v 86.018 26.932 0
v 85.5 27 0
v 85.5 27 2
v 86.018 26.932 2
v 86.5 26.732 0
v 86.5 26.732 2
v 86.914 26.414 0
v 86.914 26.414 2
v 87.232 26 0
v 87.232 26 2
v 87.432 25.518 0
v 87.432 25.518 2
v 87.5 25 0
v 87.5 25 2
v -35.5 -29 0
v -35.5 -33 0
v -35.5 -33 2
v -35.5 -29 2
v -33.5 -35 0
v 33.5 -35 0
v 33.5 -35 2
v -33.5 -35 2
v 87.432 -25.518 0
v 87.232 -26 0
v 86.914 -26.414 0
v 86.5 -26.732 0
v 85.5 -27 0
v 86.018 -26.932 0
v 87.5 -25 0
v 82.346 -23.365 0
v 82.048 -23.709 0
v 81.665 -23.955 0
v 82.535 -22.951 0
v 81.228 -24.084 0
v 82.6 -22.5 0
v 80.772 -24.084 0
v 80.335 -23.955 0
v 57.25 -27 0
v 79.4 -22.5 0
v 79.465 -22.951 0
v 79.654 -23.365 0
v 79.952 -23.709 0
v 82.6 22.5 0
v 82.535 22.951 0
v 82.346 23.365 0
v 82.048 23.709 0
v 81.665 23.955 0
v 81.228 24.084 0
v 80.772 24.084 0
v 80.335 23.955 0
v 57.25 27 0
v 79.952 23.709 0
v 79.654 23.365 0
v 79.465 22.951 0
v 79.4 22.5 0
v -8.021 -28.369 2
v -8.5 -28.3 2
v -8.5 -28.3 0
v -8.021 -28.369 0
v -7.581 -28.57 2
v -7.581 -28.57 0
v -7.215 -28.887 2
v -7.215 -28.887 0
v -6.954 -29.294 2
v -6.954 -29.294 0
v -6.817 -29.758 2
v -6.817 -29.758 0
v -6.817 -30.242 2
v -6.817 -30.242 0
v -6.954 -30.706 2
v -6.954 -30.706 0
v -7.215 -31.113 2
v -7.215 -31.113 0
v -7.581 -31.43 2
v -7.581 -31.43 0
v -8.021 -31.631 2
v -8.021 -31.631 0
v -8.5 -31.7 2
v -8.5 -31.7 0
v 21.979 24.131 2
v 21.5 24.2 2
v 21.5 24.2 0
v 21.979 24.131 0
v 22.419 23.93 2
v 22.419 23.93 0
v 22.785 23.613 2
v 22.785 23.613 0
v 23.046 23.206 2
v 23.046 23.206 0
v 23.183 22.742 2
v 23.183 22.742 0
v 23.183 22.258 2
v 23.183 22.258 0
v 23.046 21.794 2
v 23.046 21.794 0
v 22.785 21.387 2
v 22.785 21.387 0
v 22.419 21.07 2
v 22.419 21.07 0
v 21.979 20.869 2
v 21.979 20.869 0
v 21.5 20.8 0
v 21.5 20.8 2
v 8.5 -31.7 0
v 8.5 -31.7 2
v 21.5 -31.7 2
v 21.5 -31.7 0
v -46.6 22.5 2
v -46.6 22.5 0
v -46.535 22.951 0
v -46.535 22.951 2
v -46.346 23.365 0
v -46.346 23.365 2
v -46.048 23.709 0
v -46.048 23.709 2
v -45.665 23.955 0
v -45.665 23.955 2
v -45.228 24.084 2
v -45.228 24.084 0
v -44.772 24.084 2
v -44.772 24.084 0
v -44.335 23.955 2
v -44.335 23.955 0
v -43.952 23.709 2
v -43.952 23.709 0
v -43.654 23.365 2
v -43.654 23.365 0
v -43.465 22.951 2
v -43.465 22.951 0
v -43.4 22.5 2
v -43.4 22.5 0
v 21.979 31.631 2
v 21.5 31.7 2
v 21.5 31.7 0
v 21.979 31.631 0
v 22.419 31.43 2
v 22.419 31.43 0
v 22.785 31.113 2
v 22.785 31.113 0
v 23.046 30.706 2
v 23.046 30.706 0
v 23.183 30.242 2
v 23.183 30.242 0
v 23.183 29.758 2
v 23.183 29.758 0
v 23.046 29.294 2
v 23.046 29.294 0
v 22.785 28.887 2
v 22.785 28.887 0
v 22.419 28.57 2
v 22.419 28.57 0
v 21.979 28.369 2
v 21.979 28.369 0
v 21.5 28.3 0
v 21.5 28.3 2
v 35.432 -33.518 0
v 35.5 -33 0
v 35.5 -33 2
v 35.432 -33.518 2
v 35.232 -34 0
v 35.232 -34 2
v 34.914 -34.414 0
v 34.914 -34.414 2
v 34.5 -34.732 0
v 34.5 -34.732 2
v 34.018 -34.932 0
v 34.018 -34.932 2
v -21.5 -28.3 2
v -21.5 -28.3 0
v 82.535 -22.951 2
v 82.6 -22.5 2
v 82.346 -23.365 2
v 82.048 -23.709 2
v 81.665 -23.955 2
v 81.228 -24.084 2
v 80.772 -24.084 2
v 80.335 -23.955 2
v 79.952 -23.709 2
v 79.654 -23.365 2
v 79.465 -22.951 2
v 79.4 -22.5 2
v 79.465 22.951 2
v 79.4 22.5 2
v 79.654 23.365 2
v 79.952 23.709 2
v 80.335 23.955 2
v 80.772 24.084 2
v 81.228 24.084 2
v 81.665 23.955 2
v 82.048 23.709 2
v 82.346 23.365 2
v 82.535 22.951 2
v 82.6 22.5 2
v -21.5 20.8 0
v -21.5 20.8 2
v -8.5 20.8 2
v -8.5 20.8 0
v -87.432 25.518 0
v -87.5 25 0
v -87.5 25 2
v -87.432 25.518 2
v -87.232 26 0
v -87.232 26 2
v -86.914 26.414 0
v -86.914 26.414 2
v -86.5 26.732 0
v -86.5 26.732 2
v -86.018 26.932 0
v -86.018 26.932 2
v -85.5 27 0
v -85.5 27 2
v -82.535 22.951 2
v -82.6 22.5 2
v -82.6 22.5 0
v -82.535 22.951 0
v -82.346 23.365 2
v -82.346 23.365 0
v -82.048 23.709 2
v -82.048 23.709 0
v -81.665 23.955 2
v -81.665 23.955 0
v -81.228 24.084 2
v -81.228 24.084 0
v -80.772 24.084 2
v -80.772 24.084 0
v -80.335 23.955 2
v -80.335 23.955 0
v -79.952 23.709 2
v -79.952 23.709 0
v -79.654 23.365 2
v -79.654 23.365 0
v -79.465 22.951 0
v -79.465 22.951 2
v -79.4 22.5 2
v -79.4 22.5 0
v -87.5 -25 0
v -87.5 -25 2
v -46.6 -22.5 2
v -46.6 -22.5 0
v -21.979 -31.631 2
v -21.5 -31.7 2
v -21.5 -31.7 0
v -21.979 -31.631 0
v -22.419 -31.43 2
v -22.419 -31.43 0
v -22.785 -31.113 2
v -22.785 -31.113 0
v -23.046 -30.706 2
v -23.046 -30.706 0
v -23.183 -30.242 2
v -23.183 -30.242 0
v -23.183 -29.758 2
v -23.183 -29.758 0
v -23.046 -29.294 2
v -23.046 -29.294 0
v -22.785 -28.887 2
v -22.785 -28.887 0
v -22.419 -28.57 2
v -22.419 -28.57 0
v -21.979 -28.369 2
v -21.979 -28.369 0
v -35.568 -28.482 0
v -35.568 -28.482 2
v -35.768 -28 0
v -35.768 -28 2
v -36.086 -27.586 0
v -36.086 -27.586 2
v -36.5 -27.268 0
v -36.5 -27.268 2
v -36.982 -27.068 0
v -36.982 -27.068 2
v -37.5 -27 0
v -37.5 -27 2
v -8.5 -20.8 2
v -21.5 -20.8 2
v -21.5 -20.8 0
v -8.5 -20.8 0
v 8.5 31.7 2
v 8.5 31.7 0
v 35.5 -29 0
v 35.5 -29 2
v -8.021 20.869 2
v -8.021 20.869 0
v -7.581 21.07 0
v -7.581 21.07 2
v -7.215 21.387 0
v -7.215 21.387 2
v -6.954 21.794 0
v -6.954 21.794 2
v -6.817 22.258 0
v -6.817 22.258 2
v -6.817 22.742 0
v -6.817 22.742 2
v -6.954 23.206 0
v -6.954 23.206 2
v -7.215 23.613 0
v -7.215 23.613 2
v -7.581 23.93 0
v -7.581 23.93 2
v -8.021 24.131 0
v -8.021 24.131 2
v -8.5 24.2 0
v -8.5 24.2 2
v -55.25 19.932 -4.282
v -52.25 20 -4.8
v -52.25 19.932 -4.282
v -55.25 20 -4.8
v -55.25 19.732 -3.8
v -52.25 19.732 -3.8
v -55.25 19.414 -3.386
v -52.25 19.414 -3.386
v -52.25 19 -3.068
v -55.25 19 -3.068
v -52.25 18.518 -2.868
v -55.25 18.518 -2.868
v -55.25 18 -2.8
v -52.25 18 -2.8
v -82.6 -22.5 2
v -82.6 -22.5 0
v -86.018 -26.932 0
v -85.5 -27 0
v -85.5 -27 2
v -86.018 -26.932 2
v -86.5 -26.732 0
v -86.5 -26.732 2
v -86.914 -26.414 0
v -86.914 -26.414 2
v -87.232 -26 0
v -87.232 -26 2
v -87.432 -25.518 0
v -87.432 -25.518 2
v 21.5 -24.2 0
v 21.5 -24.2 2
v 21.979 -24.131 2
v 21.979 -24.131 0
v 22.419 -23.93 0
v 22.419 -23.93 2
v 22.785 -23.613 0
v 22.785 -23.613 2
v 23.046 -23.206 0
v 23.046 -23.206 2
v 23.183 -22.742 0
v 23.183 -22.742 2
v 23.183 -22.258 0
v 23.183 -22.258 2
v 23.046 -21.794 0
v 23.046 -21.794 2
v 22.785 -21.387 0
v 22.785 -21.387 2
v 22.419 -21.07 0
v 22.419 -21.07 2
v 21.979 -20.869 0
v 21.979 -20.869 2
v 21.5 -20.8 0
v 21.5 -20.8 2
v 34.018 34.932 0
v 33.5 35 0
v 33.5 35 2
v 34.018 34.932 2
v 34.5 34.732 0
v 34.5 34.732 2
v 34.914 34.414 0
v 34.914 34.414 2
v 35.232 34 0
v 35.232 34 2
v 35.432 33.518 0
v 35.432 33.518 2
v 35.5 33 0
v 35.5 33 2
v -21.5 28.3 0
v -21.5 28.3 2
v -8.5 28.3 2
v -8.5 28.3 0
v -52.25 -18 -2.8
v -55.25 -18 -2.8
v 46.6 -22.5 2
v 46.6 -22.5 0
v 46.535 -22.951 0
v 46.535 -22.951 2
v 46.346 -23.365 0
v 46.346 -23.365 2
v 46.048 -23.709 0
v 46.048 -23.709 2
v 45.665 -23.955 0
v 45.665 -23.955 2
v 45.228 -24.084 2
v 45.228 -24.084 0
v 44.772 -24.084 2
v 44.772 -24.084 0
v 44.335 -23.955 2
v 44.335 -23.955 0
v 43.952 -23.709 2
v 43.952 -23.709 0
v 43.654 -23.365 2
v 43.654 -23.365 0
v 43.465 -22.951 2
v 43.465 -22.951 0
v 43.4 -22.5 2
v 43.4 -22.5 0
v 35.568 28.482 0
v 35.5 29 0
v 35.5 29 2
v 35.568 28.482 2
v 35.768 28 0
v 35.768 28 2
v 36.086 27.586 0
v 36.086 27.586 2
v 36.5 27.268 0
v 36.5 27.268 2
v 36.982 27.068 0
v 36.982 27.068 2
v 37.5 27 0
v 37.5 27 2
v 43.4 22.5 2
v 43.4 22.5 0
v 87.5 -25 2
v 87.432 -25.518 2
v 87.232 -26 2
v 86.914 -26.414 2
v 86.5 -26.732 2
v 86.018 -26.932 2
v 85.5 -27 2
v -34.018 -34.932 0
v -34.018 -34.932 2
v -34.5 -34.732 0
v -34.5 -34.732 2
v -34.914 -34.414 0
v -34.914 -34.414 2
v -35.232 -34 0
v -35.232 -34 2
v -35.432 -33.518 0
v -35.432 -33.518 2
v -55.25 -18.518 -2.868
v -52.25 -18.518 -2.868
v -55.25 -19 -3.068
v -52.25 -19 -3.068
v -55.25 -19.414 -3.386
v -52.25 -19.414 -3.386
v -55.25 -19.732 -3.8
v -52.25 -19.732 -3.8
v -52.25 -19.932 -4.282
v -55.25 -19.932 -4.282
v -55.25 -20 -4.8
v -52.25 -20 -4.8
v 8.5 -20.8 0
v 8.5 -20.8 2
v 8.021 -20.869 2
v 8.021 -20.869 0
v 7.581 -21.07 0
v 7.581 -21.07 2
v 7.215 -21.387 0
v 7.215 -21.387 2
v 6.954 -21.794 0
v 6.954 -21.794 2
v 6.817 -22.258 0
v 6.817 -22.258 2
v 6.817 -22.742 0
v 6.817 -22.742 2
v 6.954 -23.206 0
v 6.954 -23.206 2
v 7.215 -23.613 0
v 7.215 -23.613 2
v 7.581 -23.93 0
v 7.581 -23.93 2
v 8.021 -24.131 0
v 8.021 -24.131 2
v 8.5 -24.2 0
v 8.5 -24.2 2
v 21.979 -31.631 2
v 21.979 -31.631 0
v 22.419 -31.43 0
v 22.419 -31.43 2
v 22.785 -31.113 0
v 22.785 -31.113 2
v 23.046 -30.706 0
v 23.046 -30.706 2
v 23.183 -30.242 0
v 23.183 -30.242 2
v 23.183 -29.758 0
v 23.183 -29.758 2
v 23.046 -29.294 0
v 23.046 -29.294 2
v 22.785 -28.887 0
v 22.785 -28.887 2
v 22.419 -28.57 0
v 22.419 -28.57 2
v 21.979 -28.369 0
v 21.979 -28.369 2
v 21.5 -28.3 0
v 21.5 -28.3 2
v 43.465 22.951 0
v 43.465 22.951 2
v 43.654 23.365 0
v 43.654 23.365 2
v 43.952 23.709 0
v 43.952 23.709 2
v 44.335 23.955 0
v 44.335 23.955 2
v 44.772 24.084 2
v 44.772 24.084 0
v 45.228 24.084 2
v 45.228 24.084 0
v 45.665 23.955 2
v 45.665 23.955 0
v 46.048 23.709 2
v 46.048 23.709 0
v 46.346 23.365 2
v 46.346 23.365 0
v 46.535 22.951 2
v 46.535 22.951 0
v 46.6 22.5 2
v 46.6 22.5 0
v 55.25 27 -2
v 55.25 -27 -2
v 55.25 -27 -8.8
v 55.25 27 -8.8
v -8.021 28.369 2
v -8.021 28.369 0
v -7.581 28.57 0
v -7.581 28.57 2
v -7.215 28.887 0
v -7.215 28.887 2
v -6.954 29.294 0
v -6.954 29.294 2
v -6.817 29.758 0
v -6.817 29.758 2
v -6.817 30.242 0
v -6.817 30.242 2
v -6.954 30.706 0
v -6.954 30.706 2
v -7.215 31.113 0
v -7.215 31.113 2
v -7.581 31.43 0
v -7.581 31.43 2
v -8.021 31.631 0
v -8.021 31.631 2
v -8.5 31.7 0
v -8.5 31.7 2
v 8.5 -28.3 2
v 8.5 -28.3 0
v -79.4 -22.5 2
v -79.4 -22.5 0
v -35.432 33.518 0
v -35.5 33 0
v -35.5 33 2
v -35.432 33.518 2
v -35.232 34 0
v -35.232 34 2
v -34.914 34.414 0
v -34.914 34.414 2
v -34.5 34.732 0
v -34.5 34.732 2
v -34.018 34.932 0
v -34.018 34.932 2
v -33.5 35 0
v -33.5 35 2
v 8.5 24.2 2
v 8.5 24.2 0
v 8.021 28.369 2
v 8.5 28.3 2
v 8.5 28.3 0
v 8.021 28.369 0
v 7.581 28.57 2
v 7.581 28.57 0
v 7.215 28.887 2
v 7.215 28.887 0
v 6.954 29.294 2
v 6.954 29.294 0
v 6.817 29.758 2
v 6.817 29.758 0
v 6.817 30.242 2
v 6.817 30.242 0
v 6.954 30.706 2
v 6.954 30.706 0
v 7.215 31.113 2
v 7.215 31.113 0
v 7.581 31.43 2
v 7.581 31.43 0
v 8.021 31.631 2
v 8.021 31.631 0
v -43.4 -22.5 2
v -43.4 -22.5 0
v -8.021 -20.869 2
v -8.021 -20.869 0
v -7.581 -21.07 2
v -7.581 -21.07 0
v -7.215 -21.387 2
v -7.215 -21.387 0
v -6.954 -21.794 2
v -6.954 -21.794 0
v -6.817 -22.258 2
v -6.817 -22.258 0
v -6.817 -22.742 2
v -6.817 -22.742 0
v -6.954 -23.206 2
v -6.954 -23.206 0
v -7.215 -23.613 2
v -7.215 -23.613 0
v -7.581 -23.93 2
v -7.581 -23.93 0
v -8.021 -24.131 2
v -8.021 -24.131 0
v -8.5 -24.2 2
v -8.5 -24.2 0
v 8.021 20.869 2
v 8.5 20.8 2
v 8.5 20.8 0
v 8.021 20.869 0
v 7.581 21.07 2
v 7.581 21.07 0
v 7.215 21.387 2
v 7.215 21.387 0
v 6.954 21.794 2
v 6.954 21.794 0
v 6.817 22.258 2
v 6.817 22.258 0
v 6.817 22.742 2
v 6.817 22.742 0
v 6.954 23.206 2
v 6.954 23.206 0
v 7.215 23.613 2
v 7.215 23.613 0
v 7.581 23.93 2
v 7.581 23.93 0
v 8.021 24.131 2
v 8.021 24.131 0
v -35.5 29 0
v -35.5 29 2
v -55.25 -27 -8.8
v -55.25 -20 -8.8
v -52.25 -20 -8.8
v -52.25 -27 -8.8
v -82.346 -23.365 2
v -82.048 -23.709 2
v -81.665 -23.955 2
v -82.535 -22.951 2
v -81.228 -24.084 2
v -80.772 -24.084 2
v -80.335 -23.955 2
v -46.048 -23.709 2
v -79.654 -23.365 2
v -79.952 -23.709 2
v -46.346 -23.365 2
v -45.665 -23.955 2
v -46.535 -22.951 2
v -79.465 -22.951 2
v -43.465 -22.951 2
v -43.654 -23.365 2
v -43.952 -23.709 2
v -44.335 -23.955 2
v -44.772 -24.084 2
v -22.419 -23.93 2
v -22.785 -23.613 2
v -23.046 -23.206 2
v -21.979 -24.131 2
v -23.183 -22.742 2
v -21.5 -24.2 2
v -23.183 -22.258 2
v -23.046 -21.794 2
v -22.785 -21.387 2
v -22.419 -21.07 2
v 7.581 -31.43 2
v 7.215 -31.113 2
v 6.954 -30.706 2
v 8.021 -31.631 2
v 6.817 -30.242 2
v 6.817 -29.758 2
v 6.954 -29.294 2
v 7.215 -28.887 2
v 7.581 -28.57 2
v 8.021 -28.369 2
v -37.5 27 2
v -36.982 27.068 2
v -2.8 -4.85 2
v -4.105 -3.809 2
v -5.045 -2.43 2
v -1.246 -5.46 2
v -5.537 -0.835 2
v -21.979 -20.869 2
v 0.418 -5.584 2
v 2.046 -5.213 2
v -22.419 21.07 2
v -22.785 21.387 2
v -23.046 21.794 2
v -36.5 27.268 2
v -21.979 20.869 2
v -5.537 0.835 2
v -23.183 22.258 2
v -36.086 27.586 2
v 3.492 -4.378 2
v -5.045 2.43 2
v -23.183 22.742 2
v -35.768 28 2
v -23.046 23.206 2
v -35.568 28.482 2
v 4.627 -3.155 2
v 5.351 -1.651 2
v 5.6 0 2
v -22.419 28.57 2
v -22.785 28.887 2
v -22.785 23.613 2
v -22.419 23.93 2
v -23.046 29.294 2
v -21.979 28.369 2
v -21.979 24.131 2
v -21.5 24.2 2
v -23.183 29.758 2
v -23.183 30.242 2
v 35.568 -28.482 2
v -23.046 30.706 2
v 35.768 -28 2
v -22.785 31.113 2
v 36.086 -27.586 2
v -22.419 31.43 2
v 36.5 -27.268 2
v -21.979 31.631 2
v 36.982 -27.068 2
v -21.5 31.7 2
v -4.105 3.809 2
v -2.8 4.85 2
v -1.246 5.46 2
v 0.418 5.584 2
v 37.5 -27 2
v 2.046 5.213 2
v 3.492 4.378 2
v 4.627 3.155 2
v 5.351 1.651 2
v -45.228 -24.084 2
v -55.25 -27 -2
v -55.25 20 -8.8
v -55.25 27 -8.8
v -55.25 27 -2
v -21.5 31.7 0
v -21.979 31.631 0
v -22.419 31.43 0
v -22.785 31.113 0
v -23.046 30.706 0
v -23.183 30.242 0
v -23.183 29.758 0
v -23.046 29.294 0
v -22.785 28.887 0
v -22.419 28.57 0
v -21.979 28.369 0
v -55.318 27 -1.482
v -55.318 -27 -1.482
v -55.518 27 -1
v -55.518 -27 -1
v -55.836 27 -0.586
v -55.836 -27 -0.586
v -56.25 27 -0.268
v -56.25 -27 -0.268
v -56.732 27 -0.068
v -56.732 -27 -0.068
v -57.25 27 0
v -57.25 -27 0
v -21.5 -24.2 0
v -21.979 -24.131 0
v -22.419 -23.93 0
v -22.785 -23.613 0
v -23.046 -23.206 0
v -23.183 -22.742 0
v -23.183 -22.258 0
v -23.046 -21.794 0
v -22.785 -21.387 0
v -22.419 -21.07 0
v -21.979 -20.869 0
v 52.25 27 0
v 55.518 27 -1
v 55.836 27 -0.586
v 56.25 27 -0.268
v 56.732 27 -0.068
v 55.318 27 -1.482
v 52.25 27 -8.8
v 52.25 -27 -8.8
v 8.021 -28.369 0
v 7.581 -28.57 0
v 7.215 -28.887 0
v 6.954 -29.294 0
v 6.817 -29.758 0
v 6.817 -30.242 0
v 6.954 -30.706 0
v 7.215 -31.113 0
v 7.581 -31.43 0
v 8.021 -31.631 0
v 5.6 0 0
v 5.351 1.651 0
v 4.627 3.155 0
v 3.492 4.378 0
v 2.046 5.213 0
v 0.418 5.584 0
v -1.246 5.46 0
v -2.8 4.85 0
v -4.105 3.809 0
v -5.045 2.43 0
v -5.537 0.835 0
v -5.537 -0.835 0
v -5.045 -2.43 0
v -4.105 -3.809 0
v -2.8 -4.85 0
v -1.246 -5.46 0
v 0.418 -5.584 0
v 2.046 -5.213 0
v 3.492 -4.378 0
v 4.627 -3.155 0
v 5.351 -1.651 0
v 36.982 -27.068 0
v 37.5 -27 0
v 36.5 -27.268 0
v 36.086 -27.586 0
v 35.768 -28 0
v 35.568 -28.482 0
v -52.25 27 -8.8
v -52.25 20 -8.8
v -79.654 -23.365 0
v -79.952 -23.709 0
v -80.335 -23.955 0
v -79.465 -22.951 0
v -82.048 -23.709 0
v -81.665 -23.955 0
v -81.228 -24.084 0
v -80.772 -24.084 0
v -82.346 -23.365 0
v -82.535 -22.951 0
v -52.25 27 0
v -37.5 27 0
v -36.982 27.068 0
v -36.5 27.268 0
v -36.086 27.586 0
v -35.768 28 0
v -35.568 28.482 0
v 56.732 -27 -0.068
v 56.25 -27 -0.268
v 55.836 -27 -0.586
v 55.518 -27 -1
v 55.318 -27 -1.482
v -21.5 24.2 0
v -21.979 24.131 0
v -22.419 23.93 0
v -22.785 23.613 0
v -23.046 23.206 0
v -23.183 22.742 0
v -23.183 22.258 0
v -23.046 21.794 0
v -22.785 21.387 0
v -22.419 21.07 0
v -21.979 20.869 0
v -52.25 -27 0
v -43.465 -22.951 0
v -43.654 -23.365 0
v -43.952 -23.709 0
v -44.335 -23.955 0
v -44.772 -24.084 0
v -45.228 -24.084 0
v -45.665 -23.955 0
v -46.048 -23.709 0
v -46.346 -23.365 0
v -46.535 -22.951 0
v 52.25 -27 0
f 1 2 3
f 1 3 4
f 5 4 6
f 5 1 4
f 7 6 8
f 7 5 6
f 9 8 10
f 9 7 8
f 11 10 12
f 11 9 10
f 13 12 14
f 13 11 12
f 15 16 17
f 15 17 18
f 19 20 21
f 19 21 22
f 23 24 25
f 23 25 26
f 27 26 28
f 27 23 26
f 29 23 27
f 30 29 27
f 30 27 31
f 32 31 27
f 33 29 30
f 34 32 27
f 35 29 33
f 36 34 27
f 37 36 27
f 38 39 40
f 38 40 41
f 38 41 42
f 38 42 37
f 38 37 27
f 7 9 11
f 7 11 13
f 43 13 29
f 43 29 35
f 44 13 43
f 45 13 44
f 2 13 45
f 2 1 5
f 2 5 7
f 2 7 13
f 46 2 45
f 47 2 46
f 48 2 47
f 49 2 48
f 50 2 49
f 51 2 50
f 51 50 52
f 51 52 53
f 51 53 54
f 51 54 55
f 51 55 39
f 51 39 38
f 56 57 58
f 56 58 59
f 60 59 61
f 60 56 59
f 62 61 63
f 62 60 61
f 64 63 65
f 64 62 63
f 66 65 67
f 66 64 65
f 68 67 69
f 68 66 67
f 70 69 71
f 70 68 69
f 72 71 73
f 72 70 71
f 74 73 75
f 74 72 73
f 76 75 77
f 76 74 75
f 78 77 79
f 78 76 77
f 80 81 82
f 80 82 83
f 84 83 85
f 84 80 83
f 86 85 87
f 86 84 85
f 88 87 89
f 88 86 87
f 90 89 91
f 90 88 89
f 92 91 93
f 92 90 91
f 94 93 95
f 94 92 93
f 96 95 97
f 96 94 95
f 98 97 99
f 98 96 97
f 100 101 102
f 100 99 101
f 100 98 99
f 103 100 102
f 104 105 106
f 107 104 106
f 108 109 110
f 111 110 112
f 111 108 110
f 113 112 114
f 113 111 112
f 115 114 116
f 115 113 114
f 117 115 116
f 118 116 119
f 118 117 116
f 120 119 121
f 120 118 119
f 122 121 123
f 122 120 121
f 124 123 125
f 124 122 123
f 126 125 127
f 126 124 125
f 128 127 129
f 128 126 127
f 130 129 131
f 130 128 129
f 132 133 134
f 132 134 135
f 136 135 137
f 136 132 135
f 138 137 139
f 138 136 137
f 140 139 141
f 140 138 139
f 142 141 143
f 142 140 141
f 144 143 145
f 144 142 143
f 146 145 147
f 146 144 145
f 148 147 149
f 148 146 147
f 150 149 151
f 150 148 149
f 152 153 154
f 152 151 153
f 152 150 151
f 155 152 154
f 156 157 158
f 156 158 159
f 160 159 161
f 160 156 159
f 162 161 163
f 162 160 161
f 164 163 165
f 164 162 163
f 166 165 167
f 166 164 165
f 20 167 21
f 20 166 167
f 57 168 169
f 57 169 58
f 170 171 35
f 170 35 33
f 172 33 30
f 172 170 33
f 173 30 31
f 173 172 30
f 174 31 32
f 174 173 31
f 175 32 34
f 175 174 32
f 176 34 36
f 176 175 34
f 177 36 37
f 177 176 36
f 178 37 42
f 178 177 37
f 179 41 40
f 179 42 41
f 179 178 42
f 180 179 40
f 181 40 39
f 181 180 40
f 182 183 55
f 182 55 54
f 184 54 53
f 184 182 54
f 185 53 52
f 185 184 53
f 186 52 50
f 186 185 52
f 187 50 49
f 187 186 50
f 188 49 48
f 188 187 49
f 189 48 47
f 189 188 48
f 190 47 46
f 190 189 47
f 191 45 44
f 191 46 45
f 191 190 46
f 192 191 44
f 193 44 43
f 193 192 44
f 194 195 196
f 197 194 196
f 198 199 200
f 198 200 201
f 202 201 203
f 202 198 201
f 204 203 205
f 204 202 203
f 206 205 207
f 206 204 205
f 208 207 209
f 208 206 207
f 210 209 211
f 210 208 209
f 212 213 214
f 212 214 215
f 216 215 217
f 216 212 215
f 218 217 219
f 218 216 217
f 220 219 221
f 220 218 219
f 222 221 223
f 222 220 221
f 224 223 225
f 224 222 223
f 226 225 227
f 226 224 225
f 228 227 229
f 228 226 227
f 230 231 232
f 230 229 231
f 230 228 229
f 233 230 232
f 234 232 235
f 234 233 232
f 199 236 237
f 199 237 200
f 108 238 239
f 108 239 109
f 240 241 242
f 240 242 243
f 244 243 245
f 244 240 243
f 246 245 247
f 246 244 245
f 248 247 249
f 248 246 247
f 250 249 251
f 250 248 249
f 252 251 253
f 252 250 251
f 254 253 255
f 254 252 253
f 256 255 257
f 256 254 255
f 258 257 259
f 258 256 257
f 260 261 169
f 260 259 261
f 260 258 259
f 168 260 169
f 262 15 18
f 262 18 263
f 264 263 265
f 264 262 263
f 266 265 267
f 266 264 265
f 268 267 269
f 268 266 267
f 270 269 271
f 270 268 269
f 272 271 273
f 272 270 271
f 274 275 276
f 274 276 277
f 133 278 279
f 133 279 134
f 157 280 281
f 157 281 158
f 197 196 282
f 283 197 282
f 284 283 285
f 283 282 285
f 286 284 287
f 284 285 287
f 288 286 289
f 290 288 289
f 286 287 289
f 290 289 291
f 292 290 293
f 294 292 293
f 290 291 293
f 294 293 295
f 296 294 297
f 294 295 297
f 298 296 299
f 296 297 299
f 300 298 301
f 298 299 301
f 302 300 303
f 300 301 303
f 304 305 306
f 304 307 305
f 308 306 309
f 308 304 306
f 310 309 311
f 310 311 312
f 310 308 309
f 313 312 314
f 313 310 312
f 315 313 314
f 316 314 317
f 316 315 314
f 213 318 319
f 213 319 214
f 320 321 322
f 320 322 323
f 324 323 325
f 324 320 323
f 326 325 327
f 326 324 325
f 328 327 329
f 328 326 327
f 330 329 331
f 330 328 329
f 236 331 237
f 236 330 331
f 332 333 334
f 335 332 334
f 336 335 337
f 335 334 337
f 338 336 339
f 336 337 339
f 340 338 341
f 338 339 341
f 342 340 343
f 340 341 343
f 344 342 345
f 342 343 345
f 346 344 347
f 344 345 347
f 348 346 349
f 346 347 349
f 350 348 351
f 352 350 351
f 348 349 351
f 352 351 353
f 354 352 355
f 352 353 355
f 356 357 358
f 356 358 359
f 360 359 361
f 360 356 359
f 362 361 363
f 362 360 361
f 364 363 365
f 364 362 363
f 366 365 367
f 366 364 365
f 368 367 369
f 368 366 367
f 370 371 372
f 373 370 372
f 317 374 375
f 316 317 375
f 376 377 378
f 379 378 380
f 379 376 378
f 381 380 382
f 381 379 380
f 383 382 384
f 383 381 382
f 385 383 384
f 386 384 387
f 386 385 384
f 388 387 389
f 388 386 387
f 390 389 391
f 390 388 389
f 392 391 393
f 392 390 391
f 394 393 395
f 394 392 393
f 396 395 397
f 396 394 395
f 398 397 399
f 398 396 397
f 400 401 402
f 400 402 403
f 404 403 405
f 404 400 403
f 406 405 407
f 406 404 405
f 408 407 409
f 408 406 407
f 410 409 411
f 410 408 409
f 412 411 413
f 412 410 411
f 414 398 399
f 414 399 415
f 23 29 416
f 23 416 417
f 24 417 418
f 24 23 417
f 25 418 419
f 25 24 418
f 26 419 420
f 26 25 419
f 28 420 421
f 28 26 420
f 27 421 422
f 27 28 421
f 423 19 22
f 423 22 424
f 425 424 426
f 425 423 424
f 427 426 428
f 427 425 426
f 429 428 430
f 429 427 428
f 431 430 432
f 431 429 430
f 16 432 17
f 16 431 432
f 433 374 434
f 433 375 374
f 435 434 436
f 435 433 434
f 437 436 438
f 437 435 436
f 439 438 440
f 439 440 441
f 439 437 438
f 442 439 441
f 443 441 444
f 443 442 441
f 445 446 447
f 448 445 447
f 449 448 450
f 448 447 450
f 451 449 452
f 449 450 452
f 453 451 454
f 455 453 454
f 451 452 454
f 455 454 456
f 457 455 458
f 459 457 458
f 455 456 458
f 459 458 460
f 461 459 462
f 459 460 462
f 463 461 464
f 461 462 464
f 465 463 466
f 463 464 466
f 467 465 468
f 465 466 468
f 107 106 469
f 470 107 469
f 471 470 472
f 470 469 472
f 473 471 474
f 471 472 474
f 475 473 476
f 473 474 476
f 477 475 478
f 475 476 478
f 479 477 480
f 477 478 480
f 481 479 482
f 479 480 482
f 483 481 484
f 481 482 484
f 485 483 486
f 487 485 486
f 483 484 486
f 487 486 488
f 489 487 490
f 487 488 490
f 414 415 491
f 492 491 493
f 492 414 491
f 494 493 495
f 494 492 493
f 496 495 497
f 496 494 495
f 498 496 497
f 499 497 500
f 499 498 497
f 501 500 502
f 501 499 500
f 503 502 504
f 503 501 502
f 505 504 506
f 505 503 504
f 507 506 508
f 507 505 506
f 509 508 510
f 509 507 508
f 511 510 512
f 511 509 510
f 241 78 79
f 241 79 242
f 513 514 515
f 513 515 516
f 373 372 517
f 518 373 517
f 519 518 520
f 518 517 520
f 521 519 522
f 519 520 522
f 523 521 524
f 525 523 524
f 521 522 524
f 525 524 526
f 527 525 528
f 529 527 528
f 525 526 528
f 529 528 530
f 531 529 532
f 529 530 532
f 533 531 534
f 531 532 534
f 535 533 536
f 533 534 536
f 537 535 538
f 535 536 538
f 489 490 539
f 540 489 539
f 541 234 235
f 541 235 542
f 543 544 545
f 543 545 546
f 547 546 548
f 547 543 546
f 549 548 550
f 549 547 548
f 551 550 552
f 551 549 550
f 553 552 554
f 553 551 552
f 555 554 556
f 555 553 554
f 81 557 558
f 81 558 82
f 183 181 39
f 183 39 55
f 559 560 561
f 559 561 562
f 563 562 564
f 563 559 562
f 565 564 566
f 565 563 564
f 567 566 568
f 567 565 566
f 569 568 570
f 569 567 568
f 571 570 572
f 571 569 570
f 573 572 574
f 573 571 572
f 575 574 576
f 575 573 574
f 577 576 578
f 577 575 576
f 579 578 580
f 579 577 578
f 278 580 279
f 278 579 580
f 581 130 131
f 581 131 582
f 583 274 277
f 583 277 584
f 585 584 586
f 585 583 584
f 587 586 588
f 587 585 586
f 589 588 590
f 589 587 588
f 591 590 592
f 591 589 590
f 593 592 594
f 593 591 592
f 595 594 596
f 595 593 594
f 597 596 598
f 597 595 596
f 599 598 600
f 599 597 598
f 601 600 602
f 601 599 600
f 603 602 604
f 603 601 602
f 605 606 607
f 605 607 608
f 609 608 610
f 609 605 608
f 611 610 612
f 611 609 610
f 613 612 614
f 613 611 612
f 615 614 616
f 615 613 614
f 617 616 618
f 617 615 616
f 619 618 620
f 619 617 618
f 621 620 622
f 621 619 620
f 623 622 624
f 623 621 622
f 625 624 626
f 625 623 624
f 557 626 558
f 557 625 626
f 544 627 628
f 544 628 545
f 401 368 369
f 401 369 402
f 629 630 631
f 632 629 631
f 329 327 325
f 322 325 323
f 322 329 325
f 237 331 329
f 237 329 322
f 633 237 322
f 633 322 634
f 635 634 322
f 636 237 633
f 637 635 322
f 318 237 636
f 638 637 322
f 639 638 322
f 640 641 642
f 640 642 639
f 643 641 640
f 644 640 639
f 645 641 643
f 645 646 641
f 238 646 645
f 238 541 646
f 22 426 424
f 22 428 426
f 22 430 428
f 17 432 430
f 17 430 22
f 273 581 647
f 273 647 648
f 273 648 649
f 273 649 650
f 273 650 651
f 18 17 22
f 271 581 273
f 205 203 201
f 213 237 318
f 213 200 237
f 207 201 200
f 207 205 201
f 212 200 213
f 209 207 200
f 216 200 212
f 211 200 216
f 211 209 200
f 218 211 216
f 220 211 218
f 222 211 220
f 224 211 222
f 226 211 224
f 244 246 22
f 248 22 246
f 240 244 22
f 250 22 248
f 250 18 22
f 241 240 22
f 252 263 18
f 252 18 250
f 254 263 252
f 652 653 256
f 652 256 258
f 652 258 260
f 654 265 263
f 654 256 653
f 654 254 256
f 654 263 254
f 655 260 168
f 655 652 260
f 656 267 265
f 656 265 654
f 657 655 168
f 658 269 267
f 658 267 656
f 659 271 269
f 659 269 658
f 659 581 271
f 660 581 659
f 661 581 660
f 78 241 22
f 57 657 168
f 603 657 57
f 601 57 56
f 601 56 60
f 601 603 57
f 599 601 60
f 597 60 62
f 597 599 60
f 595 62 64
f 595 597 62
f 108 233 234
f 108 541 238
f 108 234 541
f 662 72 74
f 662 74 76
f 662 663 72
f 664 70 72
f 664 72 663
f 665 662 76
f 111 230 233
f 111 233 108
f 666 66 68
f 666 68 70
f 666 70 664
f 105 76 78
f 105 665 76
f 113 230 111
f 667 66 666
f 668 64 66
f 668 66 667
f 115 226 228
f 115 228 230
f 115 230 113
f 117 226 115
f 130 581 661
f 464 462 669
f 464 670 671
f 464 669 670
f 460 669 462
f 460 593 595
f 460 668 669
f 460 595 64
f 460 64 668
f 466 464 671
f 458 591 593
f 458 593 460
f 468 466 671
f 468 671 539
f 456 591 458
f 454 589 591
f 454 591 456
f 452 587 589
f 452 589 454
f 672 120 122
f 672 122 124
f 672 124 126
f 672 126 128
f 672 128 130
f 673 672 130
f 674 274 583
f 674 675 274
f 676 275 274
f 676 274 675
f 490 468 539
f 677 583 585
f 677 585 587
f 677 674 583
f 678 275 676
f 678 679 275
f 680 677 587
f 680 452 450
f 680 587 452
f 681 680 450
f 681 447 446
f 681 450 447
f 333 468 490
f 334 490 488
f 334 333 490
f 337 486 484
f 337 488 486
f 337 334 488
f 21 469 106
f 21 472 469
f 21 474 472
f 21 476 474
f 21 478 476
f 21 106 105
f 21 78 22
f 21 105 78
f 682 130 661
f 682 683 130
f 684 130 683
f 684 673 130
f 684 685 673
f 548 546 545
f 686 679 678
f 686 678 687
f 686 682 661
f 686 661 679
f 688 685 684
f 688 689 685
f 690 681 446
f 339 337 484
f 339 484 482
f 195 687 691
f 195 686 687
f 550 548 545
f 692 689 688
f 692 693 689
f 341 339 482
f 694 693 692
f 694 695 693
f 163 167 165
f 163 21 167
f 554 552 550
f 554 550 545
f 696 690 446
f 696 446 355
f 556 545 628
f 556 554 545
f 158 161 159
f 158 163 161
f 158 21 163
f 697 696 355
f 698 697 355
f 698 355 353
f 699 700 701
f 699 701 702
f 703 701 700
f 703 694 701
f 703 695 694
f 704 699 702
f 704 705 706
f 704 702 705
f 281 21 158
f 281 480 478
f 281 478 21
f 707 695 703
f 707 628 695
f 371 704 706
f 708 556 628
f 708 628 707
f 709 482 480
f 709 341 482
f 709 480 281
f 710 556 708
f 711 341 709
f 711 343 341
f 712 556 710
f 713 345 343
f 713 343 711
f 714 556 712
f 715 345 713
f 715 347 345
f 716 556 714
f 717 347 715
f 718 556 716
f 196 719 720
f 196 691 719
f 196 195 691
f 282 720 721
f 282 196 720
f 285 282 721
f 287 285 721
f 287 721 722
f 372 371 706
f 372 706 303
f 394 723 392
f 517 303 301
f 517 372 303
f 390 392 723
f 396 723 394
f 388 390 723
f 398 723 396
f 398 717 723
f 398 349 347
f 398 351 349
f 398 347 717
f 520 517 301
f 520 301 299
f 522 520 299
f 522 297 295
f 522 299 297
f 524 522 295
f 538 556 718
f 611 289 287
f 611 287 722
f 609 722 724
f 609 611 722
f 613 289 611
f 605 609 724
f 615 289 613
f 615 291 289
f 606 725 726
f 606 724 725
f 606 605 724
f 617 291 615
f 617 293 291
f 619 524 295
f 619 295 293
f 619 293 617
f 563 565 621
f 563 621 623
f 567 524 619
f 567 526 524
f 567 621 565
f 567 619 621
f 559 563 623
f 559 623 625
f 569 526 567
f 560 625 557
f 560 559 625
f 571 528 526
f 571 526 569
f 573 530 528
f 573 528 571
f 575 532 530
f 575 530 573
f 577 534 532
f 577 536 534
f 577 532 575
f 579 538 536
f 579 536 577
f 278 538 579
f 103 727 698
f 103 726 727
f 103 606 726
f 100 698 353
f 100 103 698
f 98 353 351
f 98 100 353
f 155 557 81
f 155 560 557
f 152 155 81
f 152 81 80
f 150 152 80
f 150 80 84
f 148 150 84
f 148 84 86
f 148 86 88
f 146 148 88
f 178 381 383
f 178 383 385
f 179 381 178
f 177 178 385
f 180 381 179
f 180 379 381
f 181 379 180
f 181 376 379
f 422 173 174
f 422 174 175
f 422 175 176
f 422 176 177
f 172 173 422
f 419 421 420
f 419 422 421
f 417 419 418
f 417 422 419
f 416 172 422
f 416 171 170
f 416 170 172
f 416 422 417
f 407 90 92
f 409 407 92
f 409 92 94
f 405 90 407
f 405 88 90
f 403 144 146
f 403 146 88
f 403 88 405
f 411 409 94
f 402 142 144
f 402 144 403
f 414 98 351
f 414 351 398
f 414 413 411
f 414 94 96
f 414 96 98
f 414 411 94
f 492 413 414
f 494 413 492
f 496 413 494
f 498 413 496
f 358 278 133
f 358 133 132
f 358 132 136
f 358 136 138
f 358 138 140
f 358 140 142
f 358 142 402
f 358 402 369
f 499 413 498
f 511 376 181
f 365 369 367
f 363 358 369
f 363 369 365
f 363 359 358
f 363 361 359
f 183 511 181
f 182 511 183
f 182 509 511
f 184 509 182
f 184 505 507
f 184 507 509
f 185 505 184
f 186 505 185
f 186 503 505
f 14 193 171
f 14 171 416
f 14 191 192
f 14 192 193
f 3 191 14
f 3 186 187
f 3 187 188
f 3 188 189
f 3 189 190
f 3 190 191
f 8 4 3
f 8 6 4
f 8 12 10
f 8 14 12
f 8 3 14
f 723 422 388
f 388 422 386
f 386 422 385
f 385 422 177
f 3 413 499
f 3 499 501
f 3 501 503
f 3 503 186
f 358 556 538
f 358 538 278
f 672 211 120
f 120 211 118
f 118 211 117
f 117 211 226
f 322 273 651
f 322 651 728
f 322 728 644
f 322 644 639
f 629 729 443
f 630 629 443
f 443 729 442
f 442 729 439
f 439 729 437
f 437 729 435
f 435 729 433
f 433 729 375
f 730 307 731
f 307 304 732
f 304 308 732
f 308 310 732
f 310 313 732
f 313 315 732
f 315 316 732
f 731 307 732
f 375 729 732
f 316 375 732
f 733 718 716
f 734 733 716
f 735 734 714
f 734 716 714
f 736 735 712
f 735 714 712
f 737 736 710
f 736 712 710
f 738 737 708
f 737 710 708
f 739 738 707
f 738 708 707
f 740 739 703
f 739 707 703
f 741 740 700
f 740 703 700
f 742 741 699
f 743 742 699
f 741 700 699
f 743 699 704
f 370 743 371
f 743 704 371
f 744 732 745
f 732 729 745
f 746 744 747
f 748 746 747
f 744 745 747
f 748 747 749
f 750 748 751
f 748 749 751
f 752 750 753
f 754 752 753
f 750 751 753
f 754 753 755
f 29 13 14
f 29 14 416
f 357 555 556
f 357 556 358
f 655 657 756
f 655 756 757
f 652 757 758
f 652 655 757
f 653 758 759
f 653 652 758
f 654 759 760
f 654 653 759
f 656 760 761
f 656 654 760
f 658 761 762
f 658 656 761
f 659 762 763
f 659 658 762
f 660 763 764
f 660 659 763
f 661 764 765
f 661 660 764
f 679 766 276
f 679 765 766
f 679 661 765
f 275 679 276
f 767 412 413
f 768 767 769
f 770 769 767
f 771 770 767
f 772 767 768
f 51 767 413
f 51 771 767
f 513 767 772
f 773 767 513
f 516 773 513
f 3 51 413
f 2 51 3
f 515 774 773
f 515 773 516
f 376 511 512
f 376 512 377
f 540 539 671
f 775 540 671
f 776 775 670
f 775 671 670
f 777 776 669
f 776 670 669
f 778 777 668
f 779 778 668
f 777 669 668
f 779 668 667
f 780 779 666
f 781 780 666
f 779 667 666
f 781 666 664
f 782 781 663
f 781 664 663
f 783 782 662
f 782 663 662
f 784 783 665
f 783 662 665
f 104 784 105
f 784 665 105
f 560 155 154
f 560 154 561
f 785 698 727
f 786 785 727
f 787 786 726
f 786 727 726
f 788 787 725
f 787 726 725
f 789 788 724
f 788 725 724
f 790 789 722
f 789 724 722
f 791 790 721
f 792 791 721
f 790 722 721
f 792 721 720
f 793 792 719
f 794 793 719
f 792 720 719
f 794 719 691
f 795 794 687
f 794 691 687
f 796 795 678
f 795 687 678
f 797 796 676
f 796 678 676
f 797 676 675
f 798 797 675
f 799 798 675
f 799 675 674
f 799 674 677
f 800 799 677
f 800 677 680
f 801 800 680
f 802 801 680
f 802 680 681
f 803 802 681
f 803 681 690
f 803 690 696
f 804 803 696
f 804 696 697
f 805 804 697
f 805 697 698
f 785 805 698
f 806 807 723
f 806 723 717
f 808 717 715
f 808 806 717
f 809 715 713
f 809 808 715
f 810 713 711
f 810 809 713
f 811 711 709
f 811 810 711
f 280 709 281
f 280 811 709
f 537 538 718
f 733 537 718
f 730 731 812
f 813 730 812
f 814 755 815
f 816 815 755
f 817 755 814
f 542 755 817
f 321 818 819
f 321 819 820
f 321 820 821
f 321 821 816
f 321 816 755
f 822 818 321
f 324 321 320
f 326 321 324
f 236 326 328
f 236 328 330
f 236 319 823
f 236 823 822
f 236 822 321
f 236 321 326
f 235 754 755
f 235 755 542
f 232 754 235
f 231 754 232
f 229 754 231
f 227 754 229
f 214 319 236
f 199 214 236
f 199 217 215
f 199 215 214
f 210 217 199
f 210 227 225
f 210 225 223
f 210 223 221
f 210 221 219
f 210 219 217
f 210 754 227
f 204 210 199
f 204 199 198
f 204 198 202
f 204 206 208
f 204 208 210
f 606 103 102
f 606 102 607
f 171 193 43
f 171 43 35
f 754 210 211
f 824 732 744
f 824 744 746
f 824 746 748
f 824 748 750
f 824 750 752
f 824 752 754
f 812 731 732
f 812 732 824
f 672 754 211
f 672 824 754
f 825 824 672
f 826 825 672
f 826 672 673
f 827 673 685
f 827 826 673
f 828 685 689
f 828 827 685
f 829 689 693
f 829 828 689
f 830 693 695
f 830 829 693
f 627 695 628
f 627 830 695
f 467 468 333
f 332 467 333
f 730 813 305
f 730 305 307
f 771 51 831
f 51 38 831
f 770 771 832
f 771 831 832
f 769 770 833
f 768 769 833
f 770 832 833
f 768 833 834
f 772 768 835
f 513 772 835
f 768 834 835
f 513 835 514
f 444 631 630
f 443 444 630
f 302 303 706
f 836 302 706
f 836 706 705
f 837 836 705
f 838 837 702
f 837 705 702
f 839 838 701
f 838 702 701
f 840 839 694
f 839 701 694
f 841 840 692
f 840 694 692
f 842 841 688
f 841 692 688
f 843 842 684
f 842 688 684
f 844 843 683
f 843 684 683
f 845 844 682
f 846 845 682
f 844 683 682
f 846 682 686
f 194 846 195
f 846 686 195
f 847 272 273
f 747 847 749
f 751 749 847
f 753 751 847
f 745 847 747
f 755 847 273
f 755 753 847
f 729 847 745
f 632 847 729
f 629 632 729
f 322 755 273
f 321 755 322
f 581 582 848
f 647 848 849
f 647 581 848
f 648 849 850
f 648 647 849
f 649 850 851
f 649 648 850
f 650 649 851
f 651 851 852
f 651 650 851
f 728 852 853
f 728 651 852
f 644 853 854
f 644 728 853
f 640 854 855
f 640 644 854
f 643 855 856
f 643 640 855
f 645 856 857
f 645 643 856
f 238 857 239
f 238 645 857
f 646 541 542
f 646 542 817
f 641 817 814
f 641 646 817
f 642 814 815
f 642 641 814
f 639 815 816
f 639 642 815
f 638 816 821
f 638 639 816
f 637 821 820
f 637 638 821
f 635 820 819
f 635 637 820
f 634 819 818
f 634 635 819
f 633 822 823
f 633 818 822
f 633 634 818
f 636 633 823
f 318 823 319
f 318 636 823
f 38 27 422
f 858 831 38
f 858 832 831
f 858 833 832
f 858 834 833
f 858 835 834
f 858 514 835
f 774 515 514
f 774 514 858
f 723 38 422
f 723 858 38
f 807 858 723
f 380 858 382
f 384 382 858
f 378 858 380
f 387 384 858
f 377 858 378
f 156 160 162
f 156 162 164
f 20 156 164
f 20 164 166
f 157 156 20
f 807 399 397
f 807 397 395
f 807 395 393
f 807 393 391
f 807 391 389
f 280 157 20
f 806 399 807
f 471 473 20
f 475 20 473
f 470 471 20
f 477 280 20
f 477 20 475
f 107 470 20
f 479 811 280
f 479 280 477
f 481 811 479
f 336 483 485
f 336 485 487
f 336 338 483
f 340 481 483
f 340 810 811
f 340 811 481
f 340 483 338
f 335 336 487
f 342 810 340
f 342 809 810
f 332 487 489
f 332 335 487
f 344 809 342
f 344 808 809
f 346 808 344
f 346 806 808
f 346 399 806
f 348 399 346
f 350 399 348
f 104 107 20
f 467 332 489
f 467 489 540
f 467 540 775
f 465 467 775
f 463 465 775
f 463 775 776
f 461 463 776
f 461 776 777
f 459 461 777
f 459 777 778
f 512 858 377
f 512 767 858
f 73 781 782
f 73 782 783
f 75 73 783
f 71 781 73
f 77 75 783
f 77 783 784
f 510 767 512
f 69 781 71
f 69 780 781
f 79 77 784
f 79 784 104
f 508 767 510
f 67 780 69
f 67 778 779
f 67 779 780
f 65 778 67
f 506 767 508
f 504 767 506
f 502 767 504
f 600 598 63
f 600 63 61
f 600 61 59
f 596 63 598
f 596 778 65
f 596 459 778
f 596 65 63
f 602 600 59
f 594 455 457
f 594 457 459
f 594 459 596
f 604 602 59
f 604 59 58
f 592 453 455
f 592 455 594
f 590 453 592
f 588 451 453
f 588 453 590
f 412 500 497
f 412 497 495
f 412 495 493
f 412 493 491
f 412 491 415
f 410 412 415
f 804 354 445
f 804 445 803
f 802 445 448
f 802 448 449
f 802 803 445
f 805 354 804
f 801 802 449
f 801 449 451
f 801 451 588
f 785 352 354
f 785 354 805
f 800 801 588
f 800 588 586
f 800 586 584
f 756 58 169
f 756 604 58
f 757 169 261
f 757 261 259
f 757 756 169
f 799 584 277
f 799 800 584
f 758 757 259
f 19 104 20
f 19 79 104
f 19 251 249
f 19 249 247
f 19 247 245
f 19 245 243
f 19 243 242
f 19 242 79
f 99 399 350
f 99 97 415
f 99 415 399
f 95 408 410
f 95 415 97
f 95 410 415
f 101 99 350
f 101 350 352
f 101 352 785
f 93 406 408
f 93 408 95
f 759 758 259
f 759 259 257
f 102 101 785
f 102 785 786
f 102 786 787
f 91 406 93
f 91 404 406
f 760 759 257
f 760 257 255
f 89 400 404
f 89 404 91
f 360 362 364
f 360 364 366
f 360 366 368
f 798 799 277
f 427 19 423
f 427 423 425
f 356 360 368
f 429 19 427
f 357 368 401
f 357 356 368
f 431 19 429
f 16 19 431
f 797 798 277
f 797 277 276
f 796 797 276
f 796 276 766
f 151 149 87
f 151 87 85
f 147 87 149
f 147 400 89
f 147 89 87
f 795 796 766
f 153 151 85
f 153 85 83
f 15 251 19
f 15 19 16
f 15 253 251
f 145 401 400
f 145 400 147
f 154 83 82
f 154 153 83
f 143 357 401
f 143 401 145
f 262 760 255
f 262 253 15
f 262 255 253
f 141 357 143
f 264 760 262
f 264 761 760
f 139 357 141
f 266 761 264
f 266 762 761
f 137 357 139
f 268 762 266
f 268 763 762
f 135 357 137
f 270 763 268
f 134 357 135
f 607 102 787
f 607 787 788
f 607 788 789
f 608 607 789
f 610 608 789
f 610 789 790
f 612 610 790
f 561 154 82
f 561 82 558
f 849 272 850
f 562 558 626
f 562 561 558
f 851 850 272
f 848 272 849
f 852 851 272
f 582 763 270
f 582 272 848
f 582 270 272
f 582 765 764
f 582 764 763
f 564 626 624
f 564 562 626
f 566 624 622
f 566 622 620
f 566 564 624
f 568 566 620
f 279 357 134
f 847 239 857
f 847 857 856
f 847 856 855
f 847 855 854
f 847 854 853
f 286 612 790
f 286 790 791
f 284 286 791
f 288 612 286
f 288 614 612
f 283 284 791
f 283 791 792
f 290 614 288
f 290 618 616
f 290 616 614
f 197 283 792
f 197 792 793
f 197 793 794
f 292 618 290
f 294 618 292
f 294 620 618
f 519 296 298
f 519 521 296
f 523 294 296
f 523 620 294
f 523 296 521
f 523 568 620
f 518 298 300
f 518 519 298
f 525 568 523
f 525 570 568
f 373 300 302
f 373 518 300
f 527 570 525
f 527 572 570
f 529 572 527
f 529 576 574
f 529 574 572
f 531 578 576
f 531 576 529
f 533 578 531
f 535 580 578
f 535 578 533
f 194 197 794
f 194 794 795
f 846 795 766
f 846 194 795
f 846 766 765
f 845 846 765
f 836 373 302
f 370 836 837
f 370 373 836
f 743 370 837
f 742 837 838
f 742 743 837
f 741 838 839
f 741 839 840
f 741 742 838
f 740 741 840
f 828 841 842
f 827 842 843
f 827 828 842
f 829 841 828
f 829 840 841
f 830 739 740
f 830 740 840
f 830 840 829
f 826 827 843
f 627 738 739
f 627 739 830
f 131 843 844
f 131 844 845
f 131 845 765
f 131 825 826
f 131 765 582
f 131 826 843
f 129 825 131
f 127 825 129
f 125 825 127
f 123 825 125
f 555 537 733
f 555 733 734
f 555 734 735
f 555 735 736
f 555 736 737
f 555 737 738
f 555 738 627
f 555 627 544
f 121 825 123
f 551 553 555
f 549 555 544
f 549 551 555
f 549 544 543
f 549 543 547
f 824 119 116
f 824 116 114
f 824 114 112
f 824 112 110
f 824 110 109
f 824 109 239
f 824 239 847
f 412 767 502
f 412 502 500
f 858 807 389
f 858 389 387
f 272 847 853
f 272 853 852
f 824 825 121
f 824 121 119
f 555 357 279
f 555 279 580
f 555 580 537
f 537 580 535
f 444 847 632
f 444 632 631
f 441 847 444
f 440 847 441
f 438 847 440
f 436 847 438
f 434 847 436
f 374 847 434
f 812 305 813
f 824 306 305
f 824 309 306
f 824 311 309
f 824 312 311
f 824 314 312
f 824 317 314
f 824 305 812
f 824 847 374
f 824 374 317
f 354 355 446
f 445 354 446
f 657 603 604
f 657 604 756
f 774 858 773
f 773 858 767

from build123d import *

# Parameters (mm, degrees)
EXTRUDE_1_DEPTH     = 2
SKETCH_2_R          = 5.6
CUT_EXTRUDE_1_DEPTH = 95.26160406
SKETCH_5_W          = 3
SKETCH_5_H          = 54
EXTRUDE_2_DEPTH     = 10.8
FILLET_1_R          = 2
SKETCH_6_W          = 3
SKETCH_6_H          = 40
CUT_EXTRUDE_3_DEPTH = 6
FILLET_2_R          = 2
FILLET_3_R          = 2


with BuildPart() as part:
    # 草圖1 → 填料-伸長1 (new body)
    with BuildSketch(Plane.XY):
        with BuildLine():
            Line((35.5, 33), (35.5, 29))
            ThreePointArc((35.5, 29), (36.085786438, 27.585786438), (37.5, 27))
            Line((37.5, 27), (85.5, 27))
            ThreePointArc((85.5, 27), (86.914213562, 26.414213562), (87.5, 25))
            Line((87.5, 25), (87.5, -25))
            ThreePointArc((87.5, -25), (86.914213562, -26.414213562), (85.5, -27))
            Line((85.5, -27), (37.5, -27))
            ThreePointArc((37.5, -27), (36.085786438, -27.585786438), (35.5, -29))
            Line((35.5, -29), (35.5, -33))
            ThreePointArc((35.5, -33), (34.914213562, -34.414213562), (33.5, -35))
            Line((33.5, -35), (-33.5, -35))
            ThreePointArc((-33.5, -35), (-34.914213562, -34.414213562), (-35.5, -33))
            Line((-35.5, -33), (-35.5, -29))
            ThreePointArc((-35.5, -29), (-36.085786438, -27.585786438), (-37.5, -27))
            Line((-37.5, -27), (-85.5, -27))
            ThreePointArc((-85.5, -27), (-86.914213562, -26.414213562), (-87.5, -25))
            Line((-87.5, -25), (-87.5, 25))
            ThreePointArc((-87.5, 25), (-86.914213562, 26.414213562), (-85.5, 27))
            Line((-85.5, 27), (-37.5, 27))
            ThreePointArc((-37.5, 27), (-36.085786438, 27.585786438), (-35.5, 29))
            Line((-35.5, 29), (-35.5, 33))
            ThreePointArc((-35.5, 33), (-34.914213562, 34.414213562), (-33.5, 35))
            Line((-33.5, 35), (33.5, 35))
            ThreePointArc((33.5, 35), (34.914213562, 34.414213562), (35.5, 33))
        make_face()
    extrude(amount=EXTRUDE_1_DEPTH)

    # 草圖2 → 除料-伸長1 (cut, through all)
    with BuildSketch(Plane.XY.offset(2)):
        Circle(SKETCH_2_R)
        with BuildLine():
            Line((43.4, -22.5), (43.4, 22.5))
            ThreePointArc((43.4, 22.5), (45, 24.1), (46.6, 22.5))
            Line((46.6, 22.5), (46.6, -22.5))
            ThreePointArc((46.6, -22.5), (45, -24.1), (43.4, -22.5))
        make_face()
        with BuildLine():
            Line((-46.6, -22.5), (-46.6, 22.5))
            ThreePointArc((-46.6, 22.5), (-45, 24.1), (-43.4, 22.5))
            Line((-43.4, 22.5), (-43.4, -22.5))
            ThreePointArc((-43.4, -22.5), (-45, -24.1), (-46.6, -22.5))
        make_face()
        with BuildLine():
            Line((21.5, 28.3), (8.5, 28.3))
            ThreePointArc((8.5, 28.3), (6.8, 30), (8.5, 31.7))
            Line((8.5, 31.7), (21.5, 31.7))
            ThreePointArc((21.5, 31.7), (23.2, 30), (21.5, 28.3))
        make_face()
        with BuildLine():
            Line((-82.6, -22.5), (-82.6, 22.5))
            ThreePointArc((-82.6, 22.5), (-81, 24.1), (-79.4, 22.5))
            Line((-79.4, 22.5), (-79.4, -22.5))
            ThreePointArc((-79.4, -22.5), (-81, -24.1), (-82.6, -22.5))
        make_face()
        with BuildLine():
            Line((79.4, -22.5), (79.4, 22.5))
            ThreePointArc((79.4, 22.5), (81, 24.1), (82.6, 22.5))
            Line((82.6, 22.5), (82.6, -22.5))
            ThreePointArc((82.6, -22.5), (81, -24.1), (79.4, -22.5))
        make_face()
        with BuildLine():
            Line((21.5, 20.8), (8.5, 20.8))
            ThreePointArc((8.5, 20.8), (6.8, 22.5), (8.5, 24.2))
            Line((8.5, 24.2), (21.5, 24.2))
            ThreePointArc((21.5, 24.2), (23.2, 22.5), (21.5, 20.8))
        make_face()
        with BuildLine():
            Line((-21.5, 28.3), (-8.5, 28.3))
            ThreePointArc((-8.5, 28.3), (-6.8, 30), (-8.5, 31.7))
            Line((-8.5, 31.7), (-21.5, 31.7))
            ThreePointArc((-21.5, 31.7), (-23.2, 30), (-21.5, 28.3))
        make_face()
        with BuildLine():
            Line((-21.5, 20.8), (-8.5, 20.8))
            ThreePointArc((-8.5, 20.8), (-6.8, 22.5), (-8.5, 24.2))
            Line((-8.5, 24.2), (-21.5, 24.2))
            ThreePointArc((-21.5, 24.2), (-23.2, 22.5), (-21.5, 20.8))
        make_face()
        with BuildLine():
            Line((21.5, -28.3), (8.5, -28.3))
            ThreePointArc((8.5, -28.3), (6.8, -30), (8.5, -31.7))
            Line((8.5, -31.7), (21.5, -31.7))
            ThreePointArc((21.5, -31.7), (23.2, -30), (21.5, -28.3))
        make_face()
        with BuildLine():
            Line((21.5, -20.8), (8.5, -20.8))
            ThreePointArc((8.5, -20.8), (6.8, -22.5), (8.5, -24.2))
            Line((8.5, -24.2), (21.5, -24.2))
            ThreePointArc((21.5, -24.2), (23.2, -22.5), (21.5, -20.8))
        make_face()
        with BuildLine():
            Line((-21.5, -28.3), (-8.5, -28.3))
            ThreePointArc((-8.5, -28.3), (-6.8, -30), (-8.5, -31.7))
            Line((-8.5, -31.7), (-21.5, -31.7))
            ThreePointArc((-21.5, -31.7), (-23.2, -30), (-21.5, -28.3))
        make_face()
        with BuildLine():
            Line((-21.5, -20.8), (-8.5, -20.8))
            ThreePointArc((-8.5, -20.8), (-6.8, -22.5), (-8.5, -24.2))
            Line((-8.5, -24.2), (-21.5, -24.2))
            ThreePointArc((-21.5, -24.2), (-23.2, -22.5), (-21.5, -20.8))
        make_face()
    extrude(amount=-CUT_EXTRUDE_1_DEPTH, mode=Mode.SUBTRACT)

    # 草圖5 → 填料-伸長2 (add)
    with BuildSketch(Plane.XY.offset(2)):
        with Locations((-53.75, 0)):
            Rectangle(SKETCH_5_W, SKETCH_5_H)
        with Locations((53.75, 0)):
            Rectangle(SKETCH_5_W, SKETCH_5_H)
    extrude(amount=-EXTRUDE_2_DEPTH)

    # 圓角1
    fillet_1_edges = [part.edges().sort_by_distance(p)[0] for p in [
        (55.25, 0, 0),
    ]]
    fillet(fillet_1_edges, radius=FILLET_1_R)

    # 草圖6 → 除料-伸長3 (cut)
    with BuildSketch(Plane(origin=(0, 0, -8.8), x_dir=(-1, 0, 0), z_dir=(0, 0, -1))):
        with Locations((53.75, 0)):
            Rectangle(SKETCH_6_W, SKETCH_6_H)
    extrude(amount=-CUT_EXTRUDE_3_DEPTH, mode=Mode.SUBTRACT)

    # 圓角2
    fillet_2_edges = [part.edges().sort_by_distance(p)[0] for p in [
        (-53.75, -20, -2.8),
        (-53.75, 20, -2.8),
    ]]
    fillet(fillet_2_edges, radius=FILLET_2_R)

    # 圓角3
    fillet_3_edges = [part.edges().sort_by_distance(p)[0] for p in [
        (-55.25, 0, 0),
    ]]
    fillet(fillet_3_edges, radius=FILLET_3_R)


solid = part.part
